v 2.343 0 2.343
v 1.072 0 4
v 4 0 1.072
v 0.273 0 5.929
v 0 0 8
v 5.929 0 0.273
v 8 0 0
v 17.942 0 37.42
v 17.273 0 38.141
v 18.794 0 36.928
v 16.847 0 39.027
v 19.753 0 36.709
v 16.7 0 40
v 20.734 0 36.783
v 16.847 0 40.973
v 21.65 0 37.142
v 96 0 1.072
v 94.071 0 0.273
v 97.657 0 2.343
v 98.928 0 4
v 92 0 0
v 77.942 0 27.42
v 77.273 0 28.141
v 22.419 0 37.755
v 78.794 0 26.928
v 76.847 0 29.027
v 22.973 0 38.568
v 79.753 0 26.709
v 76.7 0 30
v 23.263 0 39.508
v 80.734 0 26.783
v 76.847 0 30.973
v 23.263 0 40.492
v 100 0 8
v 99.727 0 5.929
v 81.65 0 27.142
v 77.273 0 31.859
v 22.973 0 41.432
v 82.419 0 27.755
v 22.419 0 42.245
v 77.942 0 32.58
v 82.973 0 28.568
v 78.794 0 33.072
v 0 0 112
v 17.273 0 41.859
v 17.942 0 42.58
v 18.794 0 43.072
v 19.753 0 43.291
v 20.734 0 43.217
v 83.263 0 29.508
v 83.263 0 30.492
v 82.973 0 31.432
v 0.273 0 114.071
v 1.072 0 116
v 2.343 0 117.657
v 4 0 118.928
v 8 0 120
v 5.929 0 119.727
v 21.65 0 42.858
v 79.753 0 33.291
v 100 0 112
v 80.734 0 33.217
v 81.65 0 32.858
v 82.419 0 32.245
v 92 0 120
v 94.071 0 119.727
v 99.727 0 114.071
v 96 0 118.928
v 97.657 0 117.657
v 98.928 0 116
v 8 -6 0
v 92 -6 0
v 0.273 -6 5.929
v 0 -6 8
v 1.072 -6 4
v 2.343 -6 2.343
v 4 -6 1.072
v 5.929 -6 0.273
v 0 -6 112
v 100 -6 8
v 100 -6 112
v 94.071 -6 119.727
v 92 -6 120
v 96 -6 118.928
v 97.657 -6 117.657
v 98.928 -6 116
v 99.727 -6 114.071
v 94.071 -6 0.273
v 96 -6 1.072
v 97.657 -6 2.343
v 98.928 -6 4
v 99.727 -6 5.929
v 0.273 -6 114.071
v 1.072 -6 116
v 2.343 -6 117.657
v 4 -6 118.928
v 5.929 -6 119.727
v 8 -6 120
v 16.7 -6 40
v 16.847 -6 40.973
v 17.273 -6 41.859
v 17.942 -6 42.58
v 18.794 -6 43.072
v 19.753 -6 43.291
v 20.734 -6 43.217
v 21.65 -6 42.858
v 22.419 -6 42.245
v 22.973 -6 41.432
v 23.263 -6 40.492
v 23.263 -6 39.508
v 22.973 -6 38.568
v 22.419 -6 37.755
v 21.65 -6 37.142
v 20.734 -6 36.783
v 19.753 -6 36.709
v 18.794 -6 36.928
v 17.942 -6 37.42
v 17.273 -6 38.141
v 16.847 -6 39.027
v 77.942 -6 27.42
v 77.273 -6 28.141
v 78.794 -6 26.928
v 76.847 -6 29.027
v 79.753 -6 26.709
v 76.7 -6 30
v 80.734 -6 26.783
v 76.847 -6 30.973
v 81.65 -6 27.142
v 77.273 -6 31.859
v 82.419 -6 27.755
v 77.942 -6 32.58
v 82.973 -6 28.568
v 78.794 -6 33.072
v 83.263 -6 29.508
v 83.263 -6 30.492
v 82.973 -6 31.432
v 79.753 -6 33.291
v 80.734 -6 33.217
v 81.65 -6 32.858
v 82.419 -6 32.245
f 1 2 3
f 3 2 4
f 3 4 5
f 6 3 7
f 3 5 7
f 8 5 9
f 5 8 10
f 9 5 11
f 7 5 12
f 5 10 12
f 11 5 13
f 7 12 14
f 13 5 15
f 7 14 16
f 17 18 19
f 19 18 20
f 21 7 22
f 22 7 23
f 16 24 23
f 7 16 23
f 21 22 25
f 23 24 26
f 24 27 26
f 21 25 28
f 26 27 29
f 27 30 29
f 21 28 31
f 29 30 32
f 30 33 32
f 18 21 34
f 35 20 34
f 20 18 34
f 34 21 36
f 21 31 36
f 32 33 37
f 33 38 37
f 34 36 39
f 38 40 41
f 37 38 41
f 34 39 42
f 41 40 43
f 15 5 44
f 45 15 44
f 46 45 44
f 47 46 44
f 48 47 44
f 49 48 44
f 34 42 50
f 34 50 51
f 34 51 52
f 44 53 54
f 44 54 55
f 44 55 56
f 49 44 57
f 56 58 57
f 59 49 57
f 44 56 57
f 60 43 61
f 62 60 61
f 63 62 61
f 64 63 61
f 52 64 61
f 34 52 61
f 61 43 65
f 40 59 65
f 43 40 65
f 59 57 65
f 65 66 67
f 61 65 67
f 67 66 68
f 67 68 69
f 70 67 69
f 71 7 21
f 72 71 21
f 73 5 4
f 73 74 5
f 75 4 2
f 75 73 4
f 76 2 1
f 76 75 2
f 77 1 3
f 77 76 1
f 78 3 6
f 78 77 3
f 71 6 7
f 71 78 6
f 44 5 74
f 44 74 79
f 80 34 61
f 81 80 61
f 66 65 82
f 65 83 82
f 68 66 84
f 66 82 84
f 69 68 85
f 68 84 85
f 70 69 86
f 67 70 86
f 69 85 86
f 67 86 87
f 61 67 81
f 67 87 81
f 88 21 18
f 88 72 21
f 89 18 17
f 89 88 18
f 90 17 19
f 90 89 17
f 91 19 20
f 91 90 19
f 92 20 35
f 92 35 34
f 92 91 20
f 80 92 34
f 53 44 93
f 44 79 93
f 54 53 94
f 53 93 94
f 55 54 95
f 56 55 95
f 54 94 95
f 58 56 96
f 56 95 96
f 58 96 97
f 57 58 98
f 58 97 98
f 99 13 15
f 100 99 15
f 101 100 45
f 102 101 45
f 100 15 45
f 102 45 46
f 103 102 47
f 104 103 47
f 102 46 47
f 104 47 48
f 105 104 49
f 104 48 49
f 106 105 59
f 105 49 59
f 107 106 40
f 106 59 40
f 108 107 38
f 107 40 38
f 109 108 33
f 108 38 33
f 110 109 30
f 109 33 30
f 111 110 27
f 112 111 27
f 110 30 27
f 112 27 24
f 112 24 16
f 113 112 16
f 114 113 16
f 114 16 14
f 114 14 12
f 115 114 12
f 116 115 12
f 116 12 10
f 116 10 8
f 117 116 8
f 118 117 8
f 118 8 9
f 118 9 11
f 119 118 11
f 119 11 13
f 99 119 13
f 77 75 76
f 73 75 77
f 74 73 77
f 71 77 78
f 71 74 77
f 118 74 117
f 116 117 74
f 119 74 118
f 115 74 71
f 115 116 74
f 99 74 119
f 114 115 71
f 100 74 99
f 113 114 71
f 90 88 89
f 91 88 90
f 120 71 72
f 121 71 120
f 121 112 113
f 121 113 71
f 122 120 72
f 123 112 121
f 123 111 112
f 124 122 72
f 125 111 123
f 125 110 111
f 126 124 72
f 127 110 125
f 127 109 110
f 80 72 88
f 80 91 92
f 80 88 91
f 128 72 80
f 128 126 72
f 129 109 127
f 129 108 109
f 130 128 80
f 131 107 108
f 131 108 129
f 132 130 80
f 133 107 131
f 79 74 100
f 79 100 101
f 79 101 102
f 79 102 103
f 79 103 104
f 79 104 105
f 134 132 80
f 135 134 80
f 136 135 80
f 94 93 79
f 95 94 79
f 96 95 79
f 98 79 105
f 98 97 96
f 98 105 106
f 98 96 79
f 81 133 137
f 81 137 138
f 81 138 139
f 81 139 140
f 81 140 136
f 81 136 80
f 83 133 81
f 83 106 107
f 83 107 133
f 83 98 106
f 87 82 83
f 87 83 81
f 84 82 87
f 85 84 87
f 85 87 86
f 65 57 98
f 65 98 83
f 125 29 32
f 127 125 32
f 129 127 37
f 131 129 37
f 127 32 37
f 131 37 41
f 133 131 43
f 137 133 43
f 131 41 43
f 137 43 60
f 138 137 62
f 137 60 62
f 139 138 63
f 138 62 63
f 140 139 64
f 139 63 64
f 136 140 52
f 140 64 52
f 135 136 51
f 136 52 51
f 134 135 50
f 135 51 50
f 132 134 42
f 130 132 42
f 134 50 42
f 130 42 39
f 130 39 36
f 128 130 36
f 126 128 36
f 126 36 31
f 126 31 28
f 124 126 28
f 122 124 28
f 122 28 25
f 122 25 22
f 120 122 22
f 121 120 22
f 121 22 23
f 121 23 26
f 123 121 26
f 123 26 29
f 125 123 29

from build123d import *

# Parameters (mm, degrees)
F0_W     = 100
F0_H     = 120
F1_DEPTH = 6
F3_D     = 6.6
F4_R     = 8


with BuildPart() as f1:
    # F0 (on Front) → F1 (new body)
    with BuildSketch(Plane.XZ):
        with Locations((50, 60)):
            Rectangle(F0_W, F0_H)
    extrude(amount=F1_DEPTH)

    # F3 (through all)
    with Locations(Plane.XZ.offset(6)):
        with Locations((80, 30), (20, 40)):
            Hole(F3_D / 2)

    # F4
    f4_edges = [f1.edges().sort_by_distance(p)[0] for p in [
        (100, -3, 120),
        (100, -3, 0),
        (0, -3, 0),
        (0, -3, 120),
    ]]
    fillet(f4_edges, radius=F4_R)


solid = f1.part
